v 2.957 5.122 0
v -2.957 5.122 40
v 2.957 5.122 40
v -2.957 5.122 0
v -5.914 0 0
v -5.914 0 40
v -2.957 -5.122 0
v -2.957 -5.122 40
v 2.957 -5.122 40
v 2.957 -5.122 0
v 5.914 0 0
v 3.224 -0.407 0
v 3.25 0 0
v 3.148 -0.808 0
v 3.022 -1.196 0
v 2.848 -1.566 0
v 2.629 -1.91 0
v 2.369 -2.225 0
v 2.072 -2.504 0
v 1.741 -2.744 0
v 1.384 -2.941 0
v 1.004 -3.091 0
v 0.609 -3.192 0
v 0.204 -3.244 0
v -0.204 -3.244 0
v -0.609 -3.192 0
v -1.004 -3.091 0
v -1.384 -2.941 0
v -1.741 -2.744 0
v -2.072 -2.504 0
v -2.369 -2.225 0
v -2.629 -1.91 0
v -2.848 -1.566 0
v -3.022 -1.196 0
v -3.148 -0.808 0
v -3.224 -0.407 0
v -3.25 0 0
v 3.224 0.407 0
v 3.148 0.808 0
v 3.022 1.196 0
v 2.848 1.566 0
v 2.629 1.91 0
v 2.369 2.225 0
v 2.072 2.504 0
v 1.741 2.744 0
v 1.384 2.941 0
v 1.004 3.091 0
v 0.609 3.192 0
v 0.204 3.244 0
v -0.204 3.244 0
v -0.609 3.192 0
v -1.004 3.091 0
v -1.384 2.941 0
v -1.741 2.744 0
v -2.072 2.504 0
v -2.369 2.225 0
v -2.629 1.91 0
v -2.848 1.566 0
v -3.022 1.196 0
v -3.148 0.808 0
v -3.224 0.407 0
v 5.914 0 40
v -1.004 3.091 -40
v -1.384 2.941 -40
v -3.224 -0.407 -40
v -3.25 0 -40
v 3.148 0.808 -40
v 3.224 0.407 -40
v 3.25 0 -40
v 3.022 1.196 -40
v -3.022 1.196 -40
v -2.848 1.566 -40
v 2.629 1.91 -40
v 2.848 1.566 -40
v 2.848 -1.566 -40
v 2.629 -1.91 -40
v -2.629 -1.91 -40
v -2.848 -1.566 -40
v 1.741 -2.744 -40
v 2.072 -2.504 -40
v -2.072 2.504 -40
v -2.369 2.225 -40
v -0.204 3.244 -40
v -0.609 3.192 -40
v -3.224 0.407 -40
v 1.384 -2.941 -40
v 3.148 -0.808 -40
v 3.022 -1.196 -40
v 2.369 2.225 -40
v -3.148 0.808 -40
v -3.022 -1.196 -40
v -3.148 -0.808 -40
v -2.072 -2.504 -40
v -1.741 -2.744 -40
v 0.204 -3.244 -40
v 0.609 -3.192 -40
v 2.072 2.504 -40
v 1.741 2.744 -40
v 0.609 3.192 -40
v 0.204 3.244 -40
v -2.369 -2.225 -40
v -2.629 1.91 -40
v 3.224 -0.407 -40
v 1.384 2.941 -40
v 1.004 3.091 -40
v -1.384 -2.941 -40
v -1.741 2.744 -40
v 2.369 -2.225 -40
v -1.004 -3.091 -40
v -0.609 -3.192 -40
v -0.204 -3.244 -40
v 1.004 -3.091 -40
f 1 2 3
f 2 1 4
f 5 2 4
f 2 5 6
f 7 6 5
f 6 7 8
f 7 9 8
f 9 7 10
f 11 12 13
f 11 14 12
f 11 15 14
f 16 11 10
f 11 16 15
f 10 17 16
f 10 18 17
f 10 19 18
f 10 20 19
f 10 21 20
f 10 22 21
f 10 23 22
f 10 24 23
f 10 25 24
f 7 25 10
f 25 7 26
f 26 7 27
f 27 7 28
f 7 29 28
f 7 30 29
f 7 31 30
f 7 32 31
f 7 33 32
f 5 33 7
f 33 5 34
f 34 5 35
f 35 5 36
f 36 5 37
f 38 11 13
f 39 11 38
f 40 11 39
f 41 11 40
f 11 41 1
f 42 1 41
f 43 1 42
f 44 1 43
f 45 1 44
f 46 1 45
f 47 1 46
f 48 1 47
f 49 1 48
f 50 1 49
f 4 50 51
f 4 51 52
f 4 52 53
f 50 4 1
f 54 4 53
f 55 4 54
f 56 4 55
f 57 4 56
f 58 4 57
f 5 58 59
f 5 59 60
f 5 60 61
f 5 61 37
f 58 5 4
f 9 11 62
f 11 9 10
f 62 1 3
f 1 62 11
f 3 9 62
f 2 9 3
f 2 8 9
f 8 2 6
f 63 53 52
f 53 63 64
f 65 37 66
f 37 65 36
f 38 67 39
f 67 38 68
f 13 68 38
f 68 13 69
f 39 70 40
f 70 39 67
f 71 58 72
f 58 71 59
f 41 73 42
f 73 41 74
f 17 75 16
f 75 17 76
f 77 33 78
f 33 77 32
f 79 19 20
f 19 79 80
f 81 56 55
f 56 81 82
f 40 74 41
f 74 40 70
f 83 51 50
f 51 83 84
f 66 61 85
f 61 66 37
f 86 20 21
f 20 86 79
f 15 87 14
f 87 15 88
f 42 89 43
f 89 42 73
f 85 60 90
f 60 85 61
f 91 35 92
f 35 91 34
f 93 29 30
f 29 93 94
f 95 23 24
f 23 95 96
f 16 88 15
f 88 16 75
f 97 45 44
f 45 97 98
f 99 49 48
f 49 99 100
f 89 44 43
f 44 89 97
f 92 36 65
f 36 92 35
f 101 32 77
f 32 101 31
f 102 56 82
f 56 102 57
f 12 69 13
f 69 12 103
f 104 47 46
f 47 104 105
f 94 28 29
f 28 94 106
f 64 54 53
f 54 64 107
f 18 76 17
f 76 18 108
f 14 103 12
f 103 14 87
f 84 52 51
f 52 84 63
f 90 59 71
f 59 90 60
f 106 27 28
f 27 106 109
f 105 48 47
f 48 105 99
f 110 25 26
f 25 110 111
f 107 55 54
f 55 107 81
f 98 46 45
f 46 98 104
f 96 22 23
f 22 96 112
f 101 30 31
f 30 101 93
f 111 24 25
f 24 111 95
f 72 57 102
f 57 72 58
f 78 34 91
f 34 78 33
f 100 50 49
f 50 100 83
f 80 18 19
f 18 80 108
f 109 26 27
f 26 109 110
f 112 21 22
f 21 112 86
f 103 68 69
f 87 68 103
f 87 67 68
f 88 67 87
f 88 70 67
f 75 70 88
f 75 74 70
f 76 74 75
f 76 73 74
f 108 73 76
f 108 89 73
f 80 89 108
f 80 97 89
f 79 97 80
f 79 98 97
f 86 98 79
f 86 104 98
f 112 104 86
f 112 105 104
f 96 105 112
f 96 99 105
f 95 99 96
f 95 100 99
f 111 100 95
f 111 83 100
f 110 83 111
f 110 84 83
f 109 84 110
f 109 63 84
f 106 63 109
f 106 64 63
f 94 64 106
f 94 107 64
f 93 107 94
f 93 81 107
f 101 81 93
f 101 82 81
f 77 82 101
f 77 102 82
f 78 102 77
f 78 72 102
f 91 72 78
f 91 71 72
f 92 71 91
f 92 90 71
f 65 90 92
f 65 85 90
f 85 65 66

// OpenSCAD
$fn = 50;


difference() {
	union() {
		linear_extrude(height = 40) {
			polygon(points = [[5.9142500000, 0.0000000000], [2.9571250000, 5.1218907443], [-2.9571250000, 5.1218907443], [-5.9142500000, 0.0000000000], [-2.9571250000, -5.1218907443], [2.9571250000, -5.1218907443]]);
		}
		translate(v = [0, 0, -40]) {
			cylinder(h = 40, r = 3.2500000000);
		}
	}
	union();
}
